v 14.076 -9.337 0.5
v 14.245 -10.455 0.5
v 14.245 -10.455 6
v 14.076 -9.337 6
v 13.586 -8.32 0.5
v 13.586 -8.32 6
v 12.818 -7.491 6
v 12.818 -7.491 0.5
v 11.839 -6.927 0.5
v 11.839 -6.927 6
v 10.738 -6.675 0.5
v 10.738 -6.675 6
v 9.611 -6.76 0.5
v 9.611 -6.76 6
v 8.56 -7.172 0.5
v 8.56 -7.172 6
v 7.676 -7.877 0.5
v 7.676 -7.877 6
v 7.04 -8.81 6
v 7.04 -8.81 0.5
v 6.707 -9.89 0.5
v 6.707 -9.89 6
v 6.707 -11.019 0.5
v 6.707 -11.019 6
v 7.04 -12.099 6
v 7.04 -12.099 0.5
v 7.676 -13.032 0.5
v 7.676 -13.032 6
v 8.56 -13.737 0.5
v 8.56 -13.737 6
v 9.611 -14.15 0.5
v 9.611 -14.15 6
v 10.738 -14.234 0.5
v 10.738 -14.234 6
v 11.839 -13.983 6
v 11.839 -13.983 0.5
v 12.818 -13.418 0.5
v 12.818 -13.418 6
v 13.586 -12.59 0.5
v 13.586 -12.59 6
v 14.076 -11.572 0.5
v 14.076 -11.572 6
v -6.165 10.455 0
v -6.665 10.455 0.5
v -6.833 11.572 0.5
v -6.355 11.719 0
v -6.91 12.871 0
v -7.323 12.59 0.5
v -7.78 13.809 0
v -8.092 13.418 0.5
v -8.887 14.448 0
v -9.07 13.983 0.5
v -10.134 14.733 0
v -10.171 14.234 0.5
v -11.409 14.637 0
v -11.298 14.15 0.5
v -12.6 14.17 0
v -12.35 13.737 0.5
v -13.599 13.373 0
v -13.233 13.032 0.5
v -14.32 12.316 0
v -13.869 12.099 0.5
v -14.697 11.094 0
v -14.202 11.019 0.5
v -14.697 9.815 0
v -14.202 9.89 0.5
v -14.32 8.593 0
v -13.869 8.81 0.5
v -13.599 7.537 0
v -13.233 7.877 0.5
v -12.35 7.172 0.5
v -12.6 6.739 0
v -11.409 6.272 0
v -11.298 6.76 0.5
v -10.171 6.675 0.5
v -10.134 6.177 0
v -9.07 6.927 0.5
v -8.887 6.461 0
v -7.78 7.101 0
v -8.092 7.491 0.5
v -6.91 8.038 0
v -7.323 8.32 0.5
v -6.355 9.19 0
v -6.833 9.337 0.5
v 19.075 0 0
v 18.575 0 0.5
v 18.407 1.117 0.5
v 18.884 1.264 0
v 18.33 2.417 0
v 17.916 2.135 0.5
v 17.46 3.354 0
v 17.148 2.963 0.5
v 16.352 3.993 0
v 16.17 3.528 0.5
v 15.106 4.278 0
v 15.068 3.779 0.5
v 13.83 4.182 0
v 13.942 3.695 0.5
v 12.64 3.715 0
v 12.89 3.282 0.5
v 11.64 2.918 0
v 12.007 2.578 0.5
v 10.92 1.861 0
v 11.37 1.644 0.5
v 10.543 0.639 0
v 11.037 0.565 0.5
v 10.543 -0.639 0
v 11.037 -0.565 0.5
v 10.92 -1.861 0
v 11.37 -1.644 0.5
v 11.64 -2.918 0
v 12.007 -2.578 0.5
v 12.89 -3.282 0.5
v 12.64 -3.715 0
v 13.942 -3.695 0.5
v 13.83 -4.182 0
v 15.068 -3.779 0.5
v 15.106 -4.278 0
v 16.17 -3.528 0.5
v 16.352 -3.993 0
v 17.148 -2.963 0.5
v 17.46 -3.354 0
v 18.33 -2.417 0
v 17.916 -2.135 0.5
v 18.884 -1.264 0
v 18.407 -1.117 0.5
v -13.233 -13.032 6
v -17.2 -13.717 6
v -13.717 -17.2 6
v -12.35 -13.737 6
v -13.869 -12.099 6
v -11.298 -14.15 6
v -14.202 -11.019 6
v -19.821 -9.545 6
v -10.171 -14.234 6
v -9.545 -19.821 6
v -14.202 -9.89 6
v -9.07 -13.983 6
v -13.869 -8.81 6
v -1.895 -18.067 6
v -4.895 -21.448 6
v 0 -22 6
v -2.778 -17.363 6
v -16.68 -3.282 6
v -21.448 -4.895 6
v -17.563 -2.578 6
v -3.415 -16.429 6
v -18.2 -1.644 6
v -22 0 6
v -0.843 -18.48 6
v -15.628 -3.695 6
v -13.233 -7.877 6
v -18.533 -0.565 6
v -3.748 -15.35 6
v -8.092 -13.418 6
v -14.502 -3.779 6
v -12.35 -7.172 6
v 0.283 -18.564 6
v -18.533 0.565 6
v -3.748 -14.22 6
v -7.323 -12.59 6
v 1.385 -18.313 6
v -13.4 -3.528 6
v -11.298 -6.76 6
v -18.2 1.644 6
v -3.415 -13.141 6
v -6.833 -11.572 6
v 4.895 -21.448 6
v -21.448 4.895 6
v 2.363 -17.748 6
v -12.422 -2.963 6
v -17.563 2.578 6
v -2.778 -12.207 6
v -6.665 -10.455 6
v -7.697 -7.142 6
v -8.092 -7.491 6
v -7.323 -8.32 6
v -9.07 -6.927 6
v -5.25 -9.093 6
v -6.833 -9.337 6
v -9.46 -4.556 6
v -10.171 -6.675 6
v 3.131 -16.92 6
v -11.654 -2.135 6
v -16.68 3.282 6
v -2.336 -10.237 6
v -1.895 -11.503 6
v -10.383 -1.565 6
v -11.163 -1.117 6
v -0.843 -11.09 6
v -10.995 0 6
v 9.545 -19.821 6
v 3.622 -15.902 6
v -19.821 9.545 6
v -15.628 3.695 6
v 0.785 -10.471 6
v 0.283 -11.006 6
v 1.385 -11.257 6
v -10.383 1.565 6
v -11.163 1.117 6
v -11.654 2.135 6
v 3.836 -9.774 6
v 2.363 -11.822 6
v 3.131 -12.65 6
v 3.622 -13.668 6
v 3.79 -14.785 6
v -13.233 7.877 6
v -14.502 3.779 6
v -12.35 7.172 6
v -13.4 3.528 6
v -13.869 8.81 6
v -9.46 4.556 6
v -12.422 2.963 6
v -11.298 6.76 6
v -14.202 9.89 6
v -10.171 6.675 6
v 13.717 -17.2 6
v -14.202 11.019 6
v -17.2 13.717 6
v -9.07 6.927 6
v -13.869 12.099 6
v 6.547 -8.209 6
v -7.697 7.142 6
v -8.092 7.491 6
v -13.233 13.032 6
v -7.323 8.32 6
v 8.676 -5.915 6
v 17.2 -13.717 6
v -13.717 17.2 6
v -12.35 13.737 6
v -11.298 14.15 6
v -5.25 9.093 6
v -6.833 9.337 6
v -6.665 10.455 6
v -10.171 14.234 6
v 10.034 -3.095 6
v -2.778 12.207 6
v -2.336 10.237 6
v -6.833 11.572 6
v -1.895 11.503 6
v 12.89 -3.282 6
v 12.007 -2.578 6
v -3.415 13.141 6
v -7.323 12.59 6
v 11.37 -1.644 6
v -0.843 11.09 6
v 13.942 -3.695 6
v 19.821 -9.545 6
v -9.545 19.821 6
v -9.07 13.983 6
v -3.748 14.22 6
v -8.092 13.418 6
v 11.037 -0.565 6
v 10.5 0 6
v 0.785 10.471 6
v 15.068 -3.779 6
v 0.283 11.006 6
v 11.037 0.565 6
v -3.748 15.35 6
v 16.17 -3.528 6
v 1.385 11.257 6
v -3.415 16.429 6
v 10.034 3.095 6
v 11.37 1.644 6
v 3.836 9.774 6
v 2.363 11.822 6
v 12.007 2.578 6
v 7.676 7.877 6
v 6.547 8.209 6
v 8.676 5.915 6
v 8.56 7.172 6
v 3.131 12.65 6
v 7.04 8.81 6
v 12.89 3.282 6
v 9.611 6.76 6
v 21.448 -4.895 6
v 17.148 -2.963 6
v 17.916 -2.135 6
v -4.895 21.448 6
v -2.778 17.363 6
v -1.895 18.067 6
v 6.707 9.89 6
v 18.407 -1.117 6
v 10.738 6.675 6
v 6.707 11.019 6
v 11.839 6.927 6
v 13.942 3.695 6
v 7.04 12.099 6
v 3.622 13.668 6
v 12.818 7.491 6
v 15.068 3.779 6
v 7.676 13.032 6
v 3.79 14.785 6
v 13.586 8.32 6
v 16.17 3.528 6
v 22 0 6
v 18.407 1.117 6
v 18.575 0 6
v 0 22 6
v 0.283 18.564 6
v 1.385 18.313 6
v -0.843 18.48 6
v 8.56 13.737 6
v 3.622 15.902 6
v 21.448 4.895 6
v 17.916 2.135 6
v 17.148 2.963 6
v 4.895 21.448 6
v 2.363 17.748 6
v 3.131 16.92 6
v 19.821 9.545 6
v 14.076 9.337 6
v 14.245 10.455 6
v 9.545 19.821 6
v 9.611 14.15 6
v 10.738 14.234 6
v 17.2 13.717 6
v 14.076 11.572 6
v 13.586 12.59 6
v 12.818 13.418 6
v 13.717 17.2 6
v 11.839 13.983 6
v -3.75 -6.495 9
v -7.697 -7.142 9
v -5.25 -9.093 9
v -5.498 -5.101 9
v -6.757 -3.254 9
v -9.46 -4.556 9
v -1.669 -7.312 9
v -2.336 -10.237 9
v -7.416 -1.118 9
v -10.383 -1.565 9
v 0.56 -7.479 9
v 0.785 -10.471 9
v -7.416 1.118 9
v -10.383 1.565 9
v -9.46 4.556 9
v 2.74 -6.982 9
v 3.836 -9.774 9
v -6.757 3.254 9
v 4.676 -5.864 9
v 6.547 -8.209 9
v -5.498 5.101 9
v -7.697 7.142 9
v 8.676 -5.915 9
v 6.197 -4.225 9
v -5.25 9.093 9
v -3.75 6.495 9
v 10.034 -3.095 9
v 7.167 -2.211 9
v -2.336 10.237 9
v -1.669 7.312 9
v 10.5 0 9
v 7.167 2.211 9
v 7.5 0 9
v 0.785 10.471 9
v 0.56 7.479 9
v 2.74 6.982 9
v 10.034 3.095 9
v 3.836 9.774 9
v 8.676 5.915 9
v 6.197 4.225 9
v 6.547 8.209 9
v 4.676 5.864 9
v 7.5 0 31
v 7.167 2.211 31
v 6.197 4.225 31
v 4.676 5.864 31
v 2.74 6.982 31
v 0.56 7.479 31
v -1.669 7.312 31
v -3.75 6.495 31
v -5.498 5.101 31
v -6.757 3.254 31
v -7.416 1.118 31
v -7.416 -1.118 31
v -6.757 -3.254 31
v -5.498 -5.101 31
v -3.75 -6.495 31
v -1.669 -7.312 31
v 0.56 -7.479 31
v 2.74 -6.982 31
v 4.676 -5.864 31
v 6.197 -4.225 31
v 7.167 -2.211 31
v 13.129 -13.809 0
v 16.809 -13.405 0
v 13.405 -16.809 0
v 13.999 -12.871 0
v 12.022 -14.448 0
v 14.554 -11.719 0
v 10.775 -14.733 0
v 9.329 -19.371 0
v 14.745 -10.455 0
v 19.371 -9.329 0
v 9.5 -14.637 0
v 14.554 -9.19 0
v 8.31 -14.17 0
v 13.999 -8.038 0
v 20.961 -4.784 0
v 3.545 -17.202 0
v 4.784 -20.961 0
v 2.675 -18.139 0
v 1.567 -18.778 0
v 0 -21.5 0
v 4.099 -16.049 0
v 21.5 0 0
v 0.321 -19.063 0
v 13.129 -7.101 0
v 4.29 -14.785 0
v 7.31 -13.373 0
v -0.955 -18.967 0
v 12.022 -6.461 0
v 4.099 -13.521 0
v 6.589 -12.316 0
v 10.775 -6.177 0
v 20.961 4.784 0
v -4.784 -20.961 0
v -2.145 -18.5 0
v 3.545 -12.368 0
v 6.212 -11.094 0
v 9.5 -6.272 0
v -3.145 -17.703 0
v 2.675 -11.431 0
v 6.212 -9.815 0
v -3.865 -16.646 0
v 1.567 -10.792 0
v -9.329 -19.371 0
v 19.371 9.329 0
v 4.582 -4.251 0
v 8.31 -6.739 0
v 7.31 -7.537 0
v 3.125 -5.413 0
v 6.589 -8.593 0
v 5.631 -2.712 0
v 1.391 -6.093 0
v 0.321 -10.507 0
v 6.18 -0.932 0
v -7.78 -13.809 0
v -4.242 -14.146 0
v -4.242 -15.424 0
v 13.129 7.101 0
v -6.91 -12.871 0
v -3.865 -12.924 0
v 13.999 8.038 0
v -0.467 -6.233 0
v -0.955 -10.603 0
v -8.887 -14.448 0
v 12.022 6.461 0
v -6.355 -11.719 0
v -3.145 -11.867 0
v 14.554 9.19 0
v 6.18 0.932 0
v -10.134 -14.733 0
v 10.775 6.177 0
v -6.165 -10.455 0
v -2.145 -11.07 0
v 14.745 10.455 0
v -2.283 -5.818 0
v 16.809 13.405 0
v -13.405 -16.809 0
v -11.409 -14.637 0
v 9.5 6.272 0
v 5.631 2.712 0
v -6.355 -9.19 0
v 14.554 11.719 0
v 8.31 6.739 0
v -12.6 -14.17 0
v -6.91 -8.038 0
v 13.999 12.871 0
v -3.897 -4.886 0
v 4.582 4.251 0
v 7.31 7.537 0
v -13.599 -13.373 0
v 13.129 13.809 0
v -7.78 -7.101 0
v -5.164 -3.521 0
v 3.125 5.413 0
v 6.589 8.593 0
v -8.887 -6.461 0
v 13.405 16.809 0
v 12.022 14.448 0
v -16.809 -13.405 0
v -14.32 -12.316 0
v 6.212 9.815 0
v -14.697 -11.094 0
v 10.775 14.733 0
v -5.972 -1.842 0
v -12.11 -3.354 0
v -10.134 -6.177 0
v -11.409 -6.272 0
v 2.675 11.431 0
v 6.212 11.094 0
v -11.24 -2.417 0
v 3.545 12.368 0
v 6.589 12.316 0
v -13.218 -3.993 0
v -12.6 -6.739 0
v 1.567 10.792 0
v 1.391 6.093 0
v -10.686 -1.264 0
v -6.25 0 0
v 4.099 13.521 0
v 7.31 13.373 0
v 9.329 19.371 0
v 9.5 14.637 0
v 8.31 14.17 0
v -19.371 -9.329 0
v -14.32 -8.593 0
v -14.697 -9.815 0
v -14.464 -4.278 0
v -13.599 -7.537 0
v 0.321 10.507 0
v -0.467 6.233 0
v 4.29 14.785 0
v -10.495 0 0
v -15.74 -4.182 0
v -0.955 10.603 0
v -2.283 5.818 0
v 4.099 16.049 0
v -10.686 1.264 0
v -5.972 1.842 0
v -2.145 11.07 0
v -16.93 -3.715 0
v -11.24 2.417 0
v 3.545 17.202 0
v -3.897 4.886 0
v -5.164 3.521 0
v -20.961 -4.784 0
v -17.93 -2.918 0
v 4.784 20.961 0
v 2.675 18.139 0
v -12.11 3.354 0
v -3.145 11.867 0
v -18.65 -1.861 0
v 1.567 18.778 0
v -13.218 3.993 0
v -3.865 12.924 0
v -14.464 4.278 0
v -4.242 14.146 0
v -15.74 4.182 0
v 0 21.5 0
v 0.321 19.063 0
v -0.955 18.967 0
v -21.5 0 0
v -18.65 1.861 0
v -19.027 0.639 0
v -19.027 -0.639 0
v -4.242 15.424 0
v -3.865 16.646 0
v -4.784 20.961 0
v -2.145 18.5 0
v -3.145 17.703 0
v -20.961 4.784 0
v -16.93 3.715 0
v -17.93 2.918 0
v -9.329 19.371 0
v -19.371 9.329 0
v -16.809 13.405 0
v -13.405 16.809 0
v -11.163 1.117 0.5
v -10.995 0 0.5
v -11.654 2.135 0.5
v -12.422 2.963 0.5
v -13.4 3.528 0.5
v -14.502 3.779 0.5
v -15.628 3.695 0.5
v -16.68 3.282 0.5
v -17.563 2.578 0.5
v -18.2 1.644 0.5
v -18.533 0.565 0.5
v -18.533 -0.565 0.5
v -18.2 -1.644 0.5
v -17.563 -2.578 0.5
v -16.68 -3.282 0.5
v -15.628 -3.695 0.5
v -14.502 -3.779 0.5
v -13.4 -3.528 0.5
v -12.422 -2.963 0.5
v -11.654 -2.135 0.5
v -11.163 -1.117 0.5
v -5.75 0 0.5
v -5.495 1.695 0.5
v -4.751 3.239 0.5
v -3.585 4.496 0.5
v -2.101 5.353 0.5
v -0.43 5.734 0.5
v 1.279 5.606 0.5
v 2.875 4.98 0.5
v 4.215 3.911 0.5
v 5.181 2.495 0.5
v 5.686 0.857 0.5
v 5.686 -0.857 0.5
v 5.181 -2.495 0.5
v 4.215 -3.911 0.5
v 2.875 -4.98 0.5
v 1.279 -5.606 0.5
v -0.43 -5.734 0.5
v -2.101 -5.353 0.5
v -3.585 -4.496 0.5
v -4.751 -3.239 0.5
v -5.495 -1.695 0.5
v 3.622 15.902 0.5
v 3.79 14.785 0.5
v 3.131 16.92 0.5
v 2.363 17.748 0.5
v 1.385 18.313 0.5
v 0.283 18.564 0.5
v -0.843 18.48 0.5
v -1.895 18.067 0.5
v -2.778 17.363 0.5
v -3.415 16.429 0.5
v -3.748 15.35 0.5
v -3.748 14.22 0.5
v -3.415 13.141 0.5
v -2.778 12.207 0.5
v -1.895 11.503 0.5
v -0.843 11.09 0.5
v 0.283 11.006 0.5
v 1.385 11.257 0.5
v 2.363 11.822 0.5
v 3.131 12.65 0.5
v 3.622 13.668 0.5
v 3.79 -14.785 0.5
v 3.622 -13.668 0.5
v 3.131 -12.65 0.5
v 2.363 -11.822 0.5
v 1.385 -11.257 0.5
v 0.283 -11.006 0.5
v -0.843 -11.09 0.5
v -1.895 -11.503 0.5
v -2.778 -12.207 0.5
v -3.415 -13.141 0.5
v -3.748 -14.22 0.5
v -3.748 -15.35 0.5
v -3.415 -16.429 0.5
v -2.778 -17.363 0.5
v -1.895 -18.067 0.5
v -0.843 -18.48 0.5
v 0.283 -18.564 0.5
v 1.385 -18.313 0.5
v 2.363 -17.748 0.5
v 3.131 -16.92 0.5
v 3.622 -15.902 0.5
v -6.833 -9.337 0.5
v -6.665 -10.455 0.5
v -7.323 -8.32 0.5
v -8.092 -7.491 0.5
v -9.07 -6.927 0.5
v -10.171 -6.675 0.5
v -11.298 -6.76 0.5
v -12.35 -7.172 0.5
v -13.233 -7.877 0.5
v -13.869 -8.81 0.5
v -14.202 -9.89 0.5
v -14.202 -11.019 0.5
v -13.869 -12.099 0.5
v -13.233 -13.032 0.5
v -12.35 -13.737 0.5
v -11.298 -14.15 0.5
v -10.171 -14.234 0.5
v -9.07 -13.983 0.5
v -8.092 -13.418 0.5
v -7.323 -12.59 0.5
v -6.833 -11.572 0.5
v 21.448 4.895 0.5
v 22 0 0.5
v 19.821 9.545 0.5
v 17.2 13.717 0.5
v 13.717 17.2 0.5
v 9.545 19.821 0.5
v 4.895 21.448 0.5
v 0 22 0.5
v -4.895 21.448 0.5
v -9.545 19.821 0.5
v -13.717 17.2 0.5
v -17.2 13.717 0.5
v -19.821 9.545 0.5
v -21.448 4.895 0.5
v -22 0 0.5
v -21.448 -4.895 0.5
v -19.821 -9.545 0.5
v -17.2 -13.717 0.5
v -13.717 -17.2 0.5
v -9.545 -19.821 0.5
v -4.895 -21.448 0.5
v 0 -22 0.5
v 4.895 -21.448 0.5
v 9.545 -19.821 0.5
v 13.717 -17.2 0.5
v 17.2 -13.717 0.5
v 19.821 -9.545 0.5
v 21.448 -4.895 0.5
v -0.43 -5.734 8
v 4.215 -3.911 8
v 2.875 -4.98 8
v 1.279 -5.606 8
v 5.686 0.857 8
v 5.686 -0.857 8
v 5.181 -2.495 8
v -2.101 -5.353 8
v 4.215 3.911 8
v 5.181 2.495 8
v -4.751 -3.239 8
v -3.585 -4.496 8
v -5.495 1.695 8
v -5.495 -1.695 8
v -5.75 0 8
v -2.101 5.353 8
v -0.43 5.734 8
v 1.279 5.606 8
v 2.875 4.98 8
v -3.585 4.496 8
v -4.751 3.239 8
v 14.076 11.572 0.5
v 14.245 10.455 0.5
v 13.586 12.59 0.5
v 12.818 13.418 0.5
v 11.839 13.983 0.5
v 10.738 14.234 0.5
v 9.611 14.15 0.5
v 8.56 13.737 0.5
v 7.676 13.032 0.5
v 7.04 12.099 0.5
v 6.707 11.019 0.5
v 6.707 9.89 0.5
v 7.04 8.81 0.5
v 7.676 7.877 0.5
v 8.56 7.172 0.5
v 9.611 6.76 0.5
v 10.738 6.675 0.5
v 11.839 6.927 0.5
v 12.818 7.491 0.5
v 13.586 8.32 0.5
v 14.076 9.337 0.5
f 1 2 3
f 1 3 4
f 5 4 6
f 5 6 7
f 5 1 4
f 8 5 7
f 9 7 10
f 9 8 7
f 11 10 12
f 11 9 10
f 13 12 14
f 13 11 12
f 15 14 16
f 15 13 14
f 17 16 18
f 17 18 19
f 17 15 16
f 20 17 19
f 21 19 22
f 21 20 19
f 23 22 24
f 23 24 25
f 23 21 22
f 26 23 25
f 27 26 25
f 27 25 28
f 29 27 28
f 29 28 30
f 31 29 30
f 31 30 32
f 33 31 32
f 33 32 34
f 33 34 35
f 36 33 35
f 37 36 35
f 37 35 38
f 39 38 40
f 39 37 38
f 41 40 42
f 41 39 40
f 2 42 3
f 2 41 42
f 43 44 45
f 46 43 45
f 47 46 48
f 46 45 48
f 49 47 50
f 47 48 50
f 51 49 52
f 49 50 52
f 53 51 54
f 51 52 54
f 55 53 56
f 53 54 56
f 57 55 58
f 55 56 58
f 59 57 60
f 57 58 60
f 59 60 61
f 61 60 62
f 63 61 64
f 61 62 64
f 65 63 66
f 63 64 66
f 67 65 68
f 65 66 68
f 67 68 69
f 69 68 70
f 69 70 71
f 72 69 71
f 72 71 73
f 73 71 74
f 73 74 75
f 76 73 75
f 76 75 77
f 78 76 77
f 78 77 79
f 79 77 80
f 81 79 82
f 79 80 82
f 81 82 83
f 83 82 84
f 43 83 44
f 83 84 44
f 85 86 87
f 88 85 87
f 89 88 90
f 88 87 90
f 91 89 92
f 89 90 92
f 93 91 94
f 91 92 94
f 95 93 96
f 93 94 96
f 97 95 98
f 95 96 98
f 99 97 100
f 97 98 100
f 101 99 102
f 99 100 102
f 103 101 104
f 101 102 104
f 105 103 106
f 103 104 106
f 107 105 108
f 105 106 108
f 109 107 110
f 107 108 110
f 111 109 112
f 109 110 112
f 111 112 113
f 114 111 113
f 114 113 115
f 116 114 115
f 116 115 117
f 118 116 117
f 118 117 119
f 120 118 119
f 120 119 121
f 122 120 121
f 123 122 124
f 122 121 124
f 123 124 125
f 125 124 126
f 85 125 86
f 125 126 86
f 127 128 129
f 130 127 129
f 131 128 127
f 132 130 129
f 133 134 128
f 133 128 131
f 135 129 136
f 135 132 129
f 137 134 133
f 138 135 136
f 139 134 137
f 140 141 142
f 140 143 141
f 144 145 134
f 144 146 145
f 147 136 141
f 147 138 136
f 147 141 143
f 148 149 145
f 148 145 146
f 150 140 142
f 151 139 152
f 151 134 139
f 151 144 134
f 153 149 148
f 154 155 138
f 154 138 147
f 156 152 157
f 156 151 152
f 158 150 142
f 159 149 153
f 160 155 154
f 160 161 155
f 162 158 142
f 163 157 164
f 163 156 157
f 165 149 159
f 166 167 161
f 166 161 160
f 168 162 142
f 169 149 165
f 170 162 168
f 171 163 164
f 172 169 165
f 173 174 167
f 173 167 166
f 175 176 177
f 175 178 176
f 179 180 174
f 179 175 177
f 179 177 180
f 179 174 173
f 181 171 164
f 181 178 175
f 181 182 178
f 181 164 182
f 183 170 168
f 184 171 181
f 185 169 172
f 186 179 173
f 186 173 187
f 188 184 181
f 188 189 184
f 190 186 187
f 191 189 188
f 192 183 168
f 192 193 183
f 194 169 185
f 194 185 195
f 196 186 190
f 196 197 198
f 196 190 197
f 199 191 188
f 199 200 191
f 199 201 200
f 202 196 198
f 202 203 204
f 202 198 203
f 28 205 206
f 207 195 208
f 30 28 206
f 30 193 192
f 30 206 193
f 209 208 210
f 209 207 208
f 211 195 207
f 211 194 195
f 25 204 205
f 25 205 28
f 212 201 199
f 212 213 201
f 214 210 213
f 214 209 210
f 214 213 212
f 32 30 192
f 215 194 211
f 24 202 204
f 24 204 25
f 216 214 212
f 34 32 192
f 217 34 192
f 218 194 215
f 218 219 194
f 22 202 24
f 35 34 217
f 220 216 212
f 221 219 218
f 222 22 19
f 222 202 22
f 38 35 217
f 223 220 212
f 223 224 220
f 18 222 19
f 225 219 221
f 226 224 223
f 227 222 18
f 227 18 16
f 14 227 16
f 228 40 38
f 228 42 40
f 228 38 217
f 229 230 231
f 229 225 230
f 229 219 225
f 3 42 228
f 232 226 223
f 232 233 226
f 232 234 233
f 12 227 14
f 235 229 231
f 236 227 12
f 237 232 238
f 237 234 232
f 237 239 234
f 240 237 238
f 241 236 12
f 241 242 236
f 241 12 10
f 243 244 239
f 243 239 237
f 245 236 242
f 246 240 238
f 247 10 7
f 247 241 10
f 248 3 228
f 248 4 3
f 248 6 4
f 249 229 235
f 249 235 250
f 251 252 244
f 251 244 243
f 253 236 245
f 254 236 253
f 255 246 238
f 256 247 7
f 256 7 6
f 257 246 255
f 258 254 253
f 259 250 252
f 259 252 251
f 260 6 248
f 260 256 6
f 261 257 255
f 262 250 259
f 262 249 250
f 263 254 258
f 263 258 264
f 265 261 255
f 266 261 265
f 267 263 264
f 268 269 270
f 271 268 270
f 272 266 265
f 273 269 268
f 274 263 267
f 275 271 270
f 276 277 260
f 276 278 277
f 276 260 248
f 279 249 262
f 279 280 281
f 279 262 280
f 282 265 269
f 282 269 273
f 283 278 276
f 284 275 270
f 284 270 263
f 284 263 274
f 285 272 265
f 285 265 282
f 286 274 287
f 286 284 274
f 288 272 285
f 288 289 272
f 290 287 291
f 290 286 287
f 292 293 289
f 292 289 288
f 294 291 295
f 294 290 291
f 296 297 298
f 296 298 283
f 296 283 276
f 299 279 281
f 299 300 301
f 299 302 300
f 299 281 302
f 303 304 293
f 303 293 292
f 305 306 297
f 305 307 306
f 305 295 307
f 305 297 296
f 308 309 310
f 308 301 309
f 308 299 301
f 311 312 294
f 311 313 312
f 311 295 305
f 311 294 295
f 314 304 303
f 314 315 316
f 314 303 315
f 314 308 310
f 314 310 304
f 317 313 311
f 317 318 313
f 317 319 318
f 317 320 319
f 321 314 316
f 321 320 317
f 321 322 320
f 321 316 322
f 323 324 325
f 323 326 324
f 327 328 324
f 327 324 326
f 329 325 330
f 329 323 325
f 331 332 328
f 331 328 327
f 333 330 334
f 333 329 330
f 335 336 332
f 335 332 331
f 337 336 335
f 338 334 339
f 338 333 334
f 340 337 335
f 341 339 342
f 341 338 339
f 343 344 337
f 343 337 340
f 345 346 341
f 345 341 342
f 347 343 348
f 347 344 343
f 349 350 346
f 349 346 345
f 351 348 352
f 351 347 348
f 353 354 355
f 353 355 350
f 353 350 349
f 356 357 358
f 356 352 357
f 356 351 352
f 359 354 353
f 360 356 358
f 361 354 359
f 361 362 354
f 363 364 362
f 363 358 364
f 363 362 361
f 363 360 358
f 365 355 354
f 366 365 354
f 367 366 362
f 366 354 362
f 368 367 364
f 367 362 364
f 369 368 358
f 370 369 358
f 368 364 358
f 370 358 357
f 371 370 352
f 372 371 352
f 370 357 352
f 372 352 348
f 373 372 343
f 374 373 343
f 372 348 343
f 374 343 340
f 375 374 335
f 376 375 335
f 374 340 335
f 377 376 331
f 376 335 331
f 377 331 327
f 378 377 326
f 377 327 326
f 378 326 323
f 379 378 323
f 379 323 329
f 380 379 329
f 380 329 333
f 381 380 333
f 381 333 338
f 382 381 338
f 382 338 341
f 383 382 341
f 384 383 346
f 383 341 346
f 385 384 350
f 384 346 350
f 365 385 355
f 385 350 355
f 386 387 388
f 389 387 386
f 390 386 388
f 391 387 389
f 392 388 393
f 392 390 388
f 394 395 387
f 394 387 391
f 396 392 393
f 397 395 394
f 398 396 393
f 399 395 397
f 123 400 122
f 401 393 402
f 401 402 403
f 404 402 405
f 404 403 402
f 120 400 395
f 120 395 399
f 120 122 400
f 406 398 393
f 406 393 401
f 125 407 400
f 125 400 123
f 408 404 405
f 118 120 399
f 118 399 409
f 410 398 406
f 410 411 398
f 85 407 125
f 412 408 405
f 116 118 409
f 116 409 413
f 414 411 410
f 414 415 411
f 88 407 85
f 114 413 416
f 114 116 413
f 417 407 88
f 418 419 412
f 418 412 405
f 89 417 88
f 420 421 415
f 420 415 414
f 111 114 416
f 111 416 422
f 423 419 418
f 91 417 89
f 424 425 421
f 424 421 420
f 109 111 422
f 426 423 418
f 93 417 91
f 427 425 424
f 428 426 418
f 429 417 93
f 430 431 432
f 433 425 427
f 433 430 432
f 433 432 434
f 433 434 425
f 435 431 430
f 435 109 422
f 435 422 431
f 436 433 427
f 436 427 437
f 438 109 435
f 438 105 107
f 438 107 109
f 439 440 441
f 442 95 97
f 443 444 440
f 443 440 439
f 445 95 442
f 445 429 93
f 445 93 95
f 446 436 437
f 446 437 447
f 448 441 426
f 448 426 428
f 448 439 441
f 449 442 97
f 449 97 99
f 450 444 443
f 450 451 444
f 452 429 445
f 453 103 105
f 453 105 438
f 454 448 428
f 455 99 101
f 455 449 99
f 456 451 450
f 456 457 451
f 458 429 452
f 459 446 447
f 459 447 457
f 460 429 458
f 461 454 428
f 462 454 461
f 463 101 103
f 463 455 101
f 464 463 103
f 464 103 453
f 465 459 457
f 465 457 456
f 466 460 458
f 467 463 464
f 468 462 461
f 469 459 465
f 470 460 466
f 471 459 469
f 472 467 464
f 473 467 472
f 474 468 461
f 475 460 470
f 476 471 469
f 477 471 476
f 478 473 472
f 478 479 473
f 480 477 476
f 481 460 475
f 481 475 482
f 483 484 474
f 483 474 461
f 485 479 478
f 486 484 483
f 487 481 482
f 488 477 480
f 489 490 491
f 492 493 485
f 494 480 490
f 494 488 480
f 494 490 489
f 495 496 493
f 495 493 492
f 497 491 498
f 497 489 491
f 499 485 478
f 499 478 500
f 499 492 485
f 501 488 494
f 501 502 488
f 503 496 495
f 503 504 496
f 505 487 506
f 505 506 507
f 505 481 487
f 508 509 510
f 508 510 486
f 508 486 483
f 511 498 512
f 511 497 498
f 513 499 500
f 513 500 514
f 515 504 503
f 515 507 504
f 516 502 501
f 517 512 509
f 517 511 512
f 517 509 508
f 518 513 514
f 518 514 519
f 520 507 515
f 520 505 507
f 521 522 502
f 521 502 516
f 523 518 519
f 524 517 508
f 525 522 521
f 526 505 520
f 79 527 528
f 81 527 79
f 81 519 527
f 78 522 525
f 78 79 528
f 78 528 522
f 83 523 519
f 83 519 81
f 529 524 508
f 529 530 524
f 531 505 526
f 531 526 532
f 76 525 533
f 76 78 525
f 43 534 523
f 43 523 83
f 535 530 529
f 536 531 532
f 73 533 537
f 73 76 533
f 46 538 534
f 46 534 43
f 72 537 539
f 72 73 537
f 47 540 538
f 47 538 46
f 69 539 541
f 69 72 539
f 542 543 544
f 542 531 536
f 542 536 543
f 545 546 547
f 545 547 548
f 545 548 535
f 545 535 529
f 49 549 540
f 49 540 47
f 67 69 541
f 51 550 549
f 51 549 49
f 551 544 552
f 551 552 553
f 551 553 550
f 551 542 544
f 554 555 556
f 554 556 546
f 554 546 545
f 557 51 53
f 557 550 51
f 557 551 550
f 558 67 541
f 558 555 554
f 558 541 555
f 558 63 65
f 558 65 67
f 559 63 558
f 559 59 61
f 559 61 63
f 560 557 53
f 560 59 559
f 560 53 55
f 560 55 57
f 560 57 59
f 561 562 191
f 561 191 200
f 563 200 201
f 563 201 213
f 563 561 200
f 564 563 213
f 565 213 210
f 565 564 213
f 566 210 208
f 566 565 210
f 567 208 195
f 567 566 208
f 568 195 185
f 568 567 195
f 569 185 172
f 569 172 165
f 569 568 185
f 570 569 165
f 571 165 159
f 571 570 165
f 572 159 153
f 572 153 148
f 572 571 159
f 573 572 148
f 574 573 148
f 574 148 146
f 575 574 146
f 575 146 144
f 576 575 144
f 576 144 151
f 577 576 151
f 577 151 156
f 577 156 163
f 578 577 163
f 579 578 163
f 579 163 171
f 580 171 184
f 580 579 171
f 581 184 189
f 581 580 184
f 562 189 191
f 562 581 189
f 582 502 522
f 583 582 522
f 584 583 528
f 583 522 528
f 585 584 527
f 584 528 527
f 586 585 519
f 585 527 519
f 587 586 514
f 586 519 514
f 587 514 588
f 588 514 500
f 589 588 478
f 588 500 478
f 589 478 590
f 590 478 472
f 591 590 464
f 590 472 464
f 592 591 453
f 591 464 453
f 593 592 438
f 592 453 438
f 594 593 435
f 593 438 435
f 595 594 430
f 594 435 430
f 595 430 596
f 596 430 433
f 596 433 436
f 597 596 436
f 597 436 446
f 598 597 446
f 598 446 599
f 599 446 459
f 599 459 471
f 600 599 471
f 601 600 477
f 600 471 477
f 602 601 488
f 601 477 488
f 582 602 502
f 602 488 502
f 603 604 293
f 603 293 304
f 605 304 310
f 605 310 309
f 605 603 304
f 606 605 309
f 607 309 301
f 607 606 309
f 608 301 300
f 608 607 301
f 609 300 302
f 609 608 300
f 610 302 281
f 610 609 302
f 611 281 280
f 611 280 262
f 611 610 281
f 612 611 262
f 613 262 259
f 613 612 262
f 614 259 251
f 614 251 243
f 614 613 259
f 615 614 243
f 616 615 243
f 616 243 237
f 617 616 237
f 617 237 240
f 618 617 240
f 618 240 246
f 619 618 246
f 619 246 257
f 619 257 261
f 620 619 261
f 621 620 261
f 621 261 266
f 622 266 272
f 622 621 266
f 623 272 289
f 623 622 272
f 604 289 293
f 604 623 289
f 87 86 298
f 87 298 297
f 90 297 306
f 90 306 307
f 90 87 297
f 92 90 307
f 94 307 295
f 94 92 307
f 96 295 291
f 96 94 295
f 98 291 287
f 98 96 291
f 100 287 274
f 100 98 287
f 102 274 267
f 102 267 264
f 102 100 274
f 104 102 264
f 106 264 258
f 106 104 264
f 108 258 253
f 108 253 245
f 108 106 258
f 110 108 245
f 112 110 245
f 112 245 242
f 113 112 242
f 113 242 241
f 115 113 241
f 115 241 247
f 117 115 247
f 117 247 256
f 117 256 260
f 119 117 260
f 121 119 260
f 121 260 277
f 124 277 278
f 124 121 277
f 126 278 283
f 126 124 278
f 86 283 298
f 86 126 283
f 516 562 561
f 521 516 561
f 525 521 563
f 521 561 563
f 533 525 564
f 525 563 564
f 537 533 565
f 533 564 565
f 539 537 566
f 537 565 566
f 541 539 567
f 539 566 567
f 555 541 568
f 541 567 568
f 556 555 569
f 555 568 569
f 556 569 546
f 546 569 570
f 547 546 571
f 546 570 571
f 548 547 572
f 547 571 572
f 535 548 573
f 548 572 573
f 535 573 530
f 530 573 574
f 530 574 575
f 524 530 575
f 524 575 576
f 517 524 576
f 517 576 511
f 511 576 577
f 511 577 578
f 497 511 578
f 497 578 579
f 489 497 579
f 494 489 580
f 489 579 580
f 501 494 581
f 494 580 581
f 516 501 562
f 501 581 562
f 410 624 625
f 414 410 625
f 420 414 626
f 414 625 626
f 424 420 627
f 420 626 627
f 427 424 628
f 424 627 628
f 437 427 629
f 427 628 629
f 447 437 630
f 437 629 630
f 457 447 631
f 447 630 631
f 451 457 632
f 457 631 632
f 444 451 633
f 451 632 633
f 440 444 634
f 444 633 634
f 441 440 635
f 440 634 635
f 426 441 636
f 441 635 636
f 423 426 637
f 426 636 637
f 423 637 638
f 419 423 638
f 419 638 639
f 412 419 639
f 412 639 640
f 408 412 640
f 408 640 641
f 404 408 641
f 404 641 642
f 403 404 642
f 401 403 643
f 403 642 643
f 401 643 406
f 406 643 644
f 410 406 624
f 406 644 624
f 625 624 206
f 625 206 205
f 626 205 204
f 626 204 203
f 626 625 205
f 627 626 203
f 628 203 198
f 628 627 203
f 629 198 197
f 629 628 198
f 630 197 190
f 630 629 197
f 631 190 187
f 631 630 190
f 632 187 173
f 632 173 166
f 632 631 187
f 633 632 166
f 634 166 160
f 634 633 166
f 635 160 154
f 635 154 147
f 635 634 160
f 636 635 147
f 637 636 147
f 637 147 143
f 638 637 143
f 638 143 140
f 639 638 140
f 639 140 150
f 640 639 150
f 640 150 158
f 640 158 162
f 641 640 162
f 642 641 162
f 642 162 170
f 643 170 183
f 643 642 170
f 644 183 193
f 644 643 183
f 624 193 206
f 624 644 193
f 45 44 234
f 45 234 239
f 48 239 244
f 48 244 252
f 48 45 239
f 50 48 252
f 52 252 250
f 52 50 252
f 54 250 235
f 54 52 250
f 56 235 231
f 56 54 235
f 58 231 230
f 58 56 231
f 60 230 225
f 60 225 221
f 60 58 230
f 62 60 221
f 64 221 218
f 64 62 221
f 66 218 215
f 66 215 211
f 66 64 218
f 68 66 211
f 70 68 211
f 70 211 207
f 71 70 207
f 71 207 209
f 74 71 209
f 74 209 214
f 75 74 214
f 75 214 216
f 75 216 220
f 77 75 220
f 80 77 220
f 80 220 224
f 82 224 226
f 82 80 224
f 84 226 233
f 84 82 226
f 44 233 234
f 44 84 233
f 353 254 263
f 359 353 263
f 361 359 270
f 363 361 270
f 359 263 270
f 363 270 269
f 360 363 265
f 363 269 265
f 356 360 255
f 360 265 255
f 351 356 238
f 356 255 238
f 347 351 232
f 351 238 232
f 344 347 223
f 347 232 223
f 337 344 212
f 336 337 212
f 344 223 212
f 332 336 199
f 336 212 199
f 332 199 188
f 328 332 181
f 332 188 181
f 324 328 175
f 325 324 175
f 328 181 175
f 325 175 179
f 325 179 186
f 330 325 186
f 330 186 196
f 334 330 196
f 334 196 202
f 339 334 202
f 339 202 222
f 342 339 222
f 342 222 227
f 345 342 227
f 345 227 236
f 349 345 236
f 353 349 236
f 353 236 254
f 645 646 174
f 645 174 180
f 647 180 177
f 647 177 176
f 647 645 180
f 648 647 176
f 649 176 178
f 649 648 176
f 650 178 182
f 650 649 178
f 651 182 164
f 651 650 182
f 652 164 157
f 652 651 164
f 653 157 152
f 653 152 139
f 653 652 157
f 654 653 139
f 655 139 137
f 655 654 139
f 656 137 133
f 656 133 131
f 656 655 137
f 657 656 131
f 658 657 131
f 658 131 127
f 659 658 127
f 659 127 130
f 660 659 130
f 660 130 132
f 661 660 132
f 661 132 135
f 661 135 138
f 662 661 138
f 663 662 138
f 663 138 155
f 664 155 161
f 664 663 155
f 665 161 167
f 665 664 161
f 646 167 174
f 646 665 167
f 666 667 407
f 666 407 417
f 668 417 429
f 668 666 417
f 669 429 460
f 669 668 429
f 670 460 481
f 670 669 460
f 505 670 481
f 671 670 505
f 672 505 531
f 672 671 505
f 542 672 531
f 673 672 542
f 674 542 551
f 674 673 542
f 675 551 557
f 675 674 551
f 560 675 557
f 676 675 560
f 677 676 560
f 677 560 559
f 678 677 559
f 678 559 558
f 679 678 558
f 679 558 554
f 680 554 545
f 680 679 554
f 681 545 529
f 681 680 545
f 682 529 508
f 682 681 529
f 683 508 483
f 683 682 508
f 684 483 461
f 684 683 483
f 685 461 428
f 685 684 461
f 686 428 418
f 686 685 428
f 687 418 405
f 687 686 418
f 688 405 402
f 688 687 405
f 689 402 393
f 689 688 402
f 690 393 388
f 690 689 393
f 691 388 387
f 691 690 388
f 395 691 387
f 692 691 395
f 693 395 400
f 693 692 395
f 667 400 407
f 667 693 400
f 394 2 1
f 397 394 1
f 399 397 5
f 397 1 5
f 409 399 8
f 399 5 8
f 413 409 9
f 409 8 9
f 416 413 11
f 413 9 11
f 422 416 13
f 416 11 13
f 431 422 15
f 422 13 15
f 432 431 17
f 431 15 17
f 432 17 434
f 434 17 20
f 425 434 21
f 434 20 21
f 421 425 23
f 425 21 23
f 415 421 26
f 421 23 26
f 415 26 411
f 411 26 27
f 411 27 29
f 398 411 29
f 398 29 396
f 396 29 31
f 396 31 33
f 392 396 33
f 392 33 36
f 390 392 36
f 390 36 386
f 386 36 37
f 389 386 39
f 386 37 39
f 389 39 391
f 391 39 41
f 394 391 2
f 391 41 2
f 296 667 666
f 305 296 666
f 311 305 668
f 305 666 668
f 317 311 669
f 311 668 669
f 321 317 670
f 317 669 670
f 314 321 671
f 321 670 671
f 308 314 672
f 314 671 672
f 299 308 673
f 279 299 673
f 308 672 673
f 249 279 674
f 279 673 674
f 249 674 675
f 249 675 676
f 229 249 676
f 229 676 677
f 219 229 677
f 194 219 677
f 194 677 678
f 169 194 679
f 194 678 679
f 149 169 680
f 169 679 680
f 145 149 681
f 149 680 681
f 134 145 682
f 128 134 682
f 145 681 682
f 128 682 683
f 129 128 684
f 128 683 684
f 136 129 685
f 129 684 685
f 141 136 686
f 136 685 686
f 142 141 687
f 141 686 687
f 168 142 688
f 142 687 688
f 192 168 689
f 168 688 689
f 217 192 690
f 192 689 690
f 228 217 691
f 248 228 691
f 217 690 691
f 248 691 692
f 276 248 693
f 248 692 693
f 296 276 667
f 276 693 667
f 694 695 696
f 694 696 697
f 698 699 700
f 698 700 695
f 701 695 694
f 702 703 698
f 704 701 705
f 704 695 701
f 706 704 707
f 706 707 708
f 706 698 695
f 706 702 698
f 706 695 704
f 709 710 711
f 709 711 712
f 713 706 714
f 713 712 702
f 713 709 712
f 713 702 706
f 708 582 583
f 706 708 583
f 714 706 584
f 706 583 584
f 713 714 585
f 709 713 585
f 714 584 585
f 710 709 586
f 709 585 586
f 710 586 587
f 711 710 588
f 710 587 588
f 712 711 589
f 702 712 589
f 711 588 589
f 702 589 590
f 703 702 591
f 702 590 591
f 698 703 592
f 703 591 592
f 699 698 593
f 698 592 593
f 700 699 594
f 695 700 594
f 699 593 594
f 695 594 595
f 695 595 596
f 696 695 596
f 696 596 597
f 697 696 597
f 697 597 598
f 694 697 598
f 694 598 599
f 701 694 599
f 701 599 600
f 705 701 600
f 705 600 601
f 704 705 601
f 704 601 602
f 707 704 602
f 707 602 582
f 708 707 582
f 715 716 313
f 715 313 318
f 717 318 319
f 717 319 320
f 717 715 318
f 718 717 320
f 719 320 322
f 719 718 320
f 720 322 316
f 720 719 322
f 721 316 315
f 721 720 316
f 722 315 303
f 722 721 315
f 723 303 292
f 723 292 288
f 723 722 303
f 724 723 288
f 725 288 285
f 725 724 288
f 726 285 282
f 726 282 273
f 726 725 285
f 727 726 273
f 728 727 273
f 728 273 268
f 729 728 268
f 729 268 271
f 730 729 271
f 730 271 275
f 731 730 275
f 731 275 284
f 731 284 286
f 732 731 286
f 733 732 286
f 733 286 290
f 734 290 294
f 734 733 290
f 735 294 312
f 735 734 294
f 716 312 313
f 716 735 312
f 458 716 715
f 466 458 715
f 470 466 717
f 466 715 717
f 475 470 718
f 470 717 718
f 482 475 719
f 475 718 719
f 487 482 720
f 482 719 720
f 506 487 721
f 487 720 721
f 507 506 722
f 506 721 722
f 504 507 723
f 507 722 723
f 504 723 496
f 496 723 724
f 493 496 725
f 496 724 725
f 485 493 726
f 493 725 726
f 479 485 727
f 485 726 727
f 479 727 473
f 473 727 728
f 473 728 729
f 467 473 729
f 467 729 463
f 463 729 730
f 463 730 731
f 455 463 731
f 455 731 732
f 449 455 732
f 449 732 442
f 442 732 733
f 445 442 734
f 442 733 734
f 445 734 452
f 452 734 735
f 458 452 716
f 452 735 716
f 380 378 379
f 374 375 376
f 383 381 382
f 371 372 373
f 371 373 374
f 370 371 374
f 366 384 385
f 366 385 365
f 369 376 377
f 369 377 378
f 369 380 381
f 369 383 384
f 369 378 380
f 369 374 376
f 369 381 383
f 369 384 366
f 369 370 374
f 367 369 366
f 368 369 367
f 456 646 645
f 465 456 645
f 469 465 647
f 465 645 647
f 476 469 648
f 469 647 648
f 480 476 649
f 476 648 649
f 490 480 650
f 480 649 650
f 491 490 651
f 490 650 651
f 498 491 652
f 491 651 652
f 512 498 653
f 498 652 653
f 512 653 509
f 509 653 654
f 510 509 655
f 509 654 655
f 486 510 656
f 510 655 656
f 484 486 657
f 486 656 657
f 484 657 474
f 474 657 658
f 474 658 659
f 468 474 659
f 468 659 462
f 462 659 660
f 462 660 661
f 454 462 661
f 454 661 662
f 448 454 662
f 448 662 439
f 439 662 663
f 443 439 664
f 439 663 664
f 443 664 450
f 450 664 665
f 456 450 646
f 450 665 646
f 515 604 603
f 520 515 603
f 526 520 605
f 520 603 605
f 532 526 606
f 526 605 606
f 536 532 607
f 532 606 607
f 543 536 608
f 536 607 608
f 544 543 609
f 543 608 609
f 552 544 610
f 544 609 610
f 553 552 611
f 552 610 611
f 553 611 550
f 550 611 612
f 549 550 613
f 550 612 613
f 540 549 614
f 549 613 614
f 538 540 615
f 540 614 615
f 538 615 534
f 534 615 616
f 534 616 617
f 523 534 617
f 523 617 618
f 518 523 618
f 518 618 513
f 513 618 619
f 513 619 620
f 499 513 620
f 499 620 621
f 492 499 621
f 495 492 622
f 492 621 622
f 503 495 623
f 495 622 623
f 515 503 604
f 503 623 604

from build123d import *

# Parameters (mm, degrees)
SKETCH1_R           = 22
SKETCH1_R_2         = 3.79
SKETCH1_R_3         = 9
BOSS_EXTRUDE1_DEPTH = 6
SKETCH2_R           = 10.5
BOSS_EXTRUDE2_DEPTH = 25
SKETCH3_R           = 9
SKETCH3_R_2         = 5.75
BOSS_EXTRUDE3_DEPTH = 6
CHAMFER1_SIZE       = 0.5
CUT_EXTRUDE2_START  = -22
SKETCH4_R           = 10.5
SKETCH4_R_2         = 7.5
CUT_EXTRUDE2_DEPTH  = 22
SKETCH5_R           = 5.75
CUT_EXTRUDE3_DEPTH  = 8


with BuildPart() as part:
    # Sketch1 → Boss-Extrude1 (new body)
    with BuildSketch(Plane.XY):
        Circle(SKETCH1_R)
        with Locations((0, 14.785)):
            Circle(SKETCH1_R_2, mode=Mode.SUBTRACT)
        with Locations((10.45457376, 10.45457376)):
            Circle(SKETCH1_R_2, mode=Mode.SUBTRACT)
        with Locations((14.785, 0)):
            Circle(SKETCH1_R_2, mode=Mode.SUBTRACT)
        with Locations((10.45457376, -10.45457376)):
            Circle(SKETCH1_R_2, mode=Mode.SUBTRACT)
        with Locations((0, -14.785)):
            Circle(SKETCH1_R_2, mode=Mode.SUBTRACT)
        with Locations((-10.45457376, -10.45457376)):
            Circle(SKETCH1_R_2, mode=Mode.SUBTRACT)
        with Locations((-14.785, 0)):
            Circle(SKETCH1_R_2, mode=Mode.SUBTRACT)
        with Locations((-10.45457376, 10.45457376)):
            Circle(SKETCH1_R_2, mode=Mode.SUBTRACT)
        Circle(SKETCH1_R_3, mode=Mode.SUBTRACT)
    extrude(amount=BOSS_EXTRUDE1_DEPTH)

    # Sketch2 → Boss-Extrude2 (add)
    with BuildSketch(Plane.XY.offset(6)):
        Circle(SKETCH2_R)
    extrude(amount=BOSS_EXTRUDE2_DEPTH)

    # Sketch3 → Boss-Extrude3 (add)
    with BuildSketch(Plane(origin=(0, 0, 0), x_dir=(-1, 0, 0), z_dir=(0, 0, -1))):
        Circle(SKETCH3_R)
        Circle(SKETCH3_R_2, mode=Mode.SUBTRACT)
    extrude(amount=-BOSS_EXTRUDE3_DEPTH)

    # Chamfer1
    chamfer1_edges = [part.edges().sort_by_distance(p)[0] for p in [
        (6.66457376, 10.45457376, 0),
        (10.995, 0, 0),
        (-22, 0, 0),
        (6.66457376, -10.45457376, 0),
        (-3.79, -14.785, 0),
        (-14.24457376, -10.45457376, 0),
        (-18.575, 0, 0),
        (-14.24457376, 10.45457376, 0),
        (5.75, 0, 0),
        (-3.79, 14.785, 0),
    ]]
    chamfer(chamfer1_edges, length=CHAMFER1_SIZE)

    # Sketch4 → Cut-Extrude2 (cut)
    with BuildSketch(Plane.XY.offset(31).offset(CUT_EXTRUDE2_START)):
        Circle(SKETCH4_R)
        Circle(SKETCH4_R_2, mode=Mode.SUBTRACT)
    extrude(amount=CUT_EXTRUDE2_DEPTH, mode=Mode.SUBTRACT)

    # Sketch5 → Cut-Extrude3 (cut)
    with BuildSketch(Plane(origin=(0, 0, 0), x_dir=(-1, 0, 0), z_dir=(0, 0, -1))):
        Circle(SKETCH5_R)
    extrude(amount=-CUT_EXTRUDE3_DEPTH, mode=Mode.SUBTRACT)


solid = part.part
